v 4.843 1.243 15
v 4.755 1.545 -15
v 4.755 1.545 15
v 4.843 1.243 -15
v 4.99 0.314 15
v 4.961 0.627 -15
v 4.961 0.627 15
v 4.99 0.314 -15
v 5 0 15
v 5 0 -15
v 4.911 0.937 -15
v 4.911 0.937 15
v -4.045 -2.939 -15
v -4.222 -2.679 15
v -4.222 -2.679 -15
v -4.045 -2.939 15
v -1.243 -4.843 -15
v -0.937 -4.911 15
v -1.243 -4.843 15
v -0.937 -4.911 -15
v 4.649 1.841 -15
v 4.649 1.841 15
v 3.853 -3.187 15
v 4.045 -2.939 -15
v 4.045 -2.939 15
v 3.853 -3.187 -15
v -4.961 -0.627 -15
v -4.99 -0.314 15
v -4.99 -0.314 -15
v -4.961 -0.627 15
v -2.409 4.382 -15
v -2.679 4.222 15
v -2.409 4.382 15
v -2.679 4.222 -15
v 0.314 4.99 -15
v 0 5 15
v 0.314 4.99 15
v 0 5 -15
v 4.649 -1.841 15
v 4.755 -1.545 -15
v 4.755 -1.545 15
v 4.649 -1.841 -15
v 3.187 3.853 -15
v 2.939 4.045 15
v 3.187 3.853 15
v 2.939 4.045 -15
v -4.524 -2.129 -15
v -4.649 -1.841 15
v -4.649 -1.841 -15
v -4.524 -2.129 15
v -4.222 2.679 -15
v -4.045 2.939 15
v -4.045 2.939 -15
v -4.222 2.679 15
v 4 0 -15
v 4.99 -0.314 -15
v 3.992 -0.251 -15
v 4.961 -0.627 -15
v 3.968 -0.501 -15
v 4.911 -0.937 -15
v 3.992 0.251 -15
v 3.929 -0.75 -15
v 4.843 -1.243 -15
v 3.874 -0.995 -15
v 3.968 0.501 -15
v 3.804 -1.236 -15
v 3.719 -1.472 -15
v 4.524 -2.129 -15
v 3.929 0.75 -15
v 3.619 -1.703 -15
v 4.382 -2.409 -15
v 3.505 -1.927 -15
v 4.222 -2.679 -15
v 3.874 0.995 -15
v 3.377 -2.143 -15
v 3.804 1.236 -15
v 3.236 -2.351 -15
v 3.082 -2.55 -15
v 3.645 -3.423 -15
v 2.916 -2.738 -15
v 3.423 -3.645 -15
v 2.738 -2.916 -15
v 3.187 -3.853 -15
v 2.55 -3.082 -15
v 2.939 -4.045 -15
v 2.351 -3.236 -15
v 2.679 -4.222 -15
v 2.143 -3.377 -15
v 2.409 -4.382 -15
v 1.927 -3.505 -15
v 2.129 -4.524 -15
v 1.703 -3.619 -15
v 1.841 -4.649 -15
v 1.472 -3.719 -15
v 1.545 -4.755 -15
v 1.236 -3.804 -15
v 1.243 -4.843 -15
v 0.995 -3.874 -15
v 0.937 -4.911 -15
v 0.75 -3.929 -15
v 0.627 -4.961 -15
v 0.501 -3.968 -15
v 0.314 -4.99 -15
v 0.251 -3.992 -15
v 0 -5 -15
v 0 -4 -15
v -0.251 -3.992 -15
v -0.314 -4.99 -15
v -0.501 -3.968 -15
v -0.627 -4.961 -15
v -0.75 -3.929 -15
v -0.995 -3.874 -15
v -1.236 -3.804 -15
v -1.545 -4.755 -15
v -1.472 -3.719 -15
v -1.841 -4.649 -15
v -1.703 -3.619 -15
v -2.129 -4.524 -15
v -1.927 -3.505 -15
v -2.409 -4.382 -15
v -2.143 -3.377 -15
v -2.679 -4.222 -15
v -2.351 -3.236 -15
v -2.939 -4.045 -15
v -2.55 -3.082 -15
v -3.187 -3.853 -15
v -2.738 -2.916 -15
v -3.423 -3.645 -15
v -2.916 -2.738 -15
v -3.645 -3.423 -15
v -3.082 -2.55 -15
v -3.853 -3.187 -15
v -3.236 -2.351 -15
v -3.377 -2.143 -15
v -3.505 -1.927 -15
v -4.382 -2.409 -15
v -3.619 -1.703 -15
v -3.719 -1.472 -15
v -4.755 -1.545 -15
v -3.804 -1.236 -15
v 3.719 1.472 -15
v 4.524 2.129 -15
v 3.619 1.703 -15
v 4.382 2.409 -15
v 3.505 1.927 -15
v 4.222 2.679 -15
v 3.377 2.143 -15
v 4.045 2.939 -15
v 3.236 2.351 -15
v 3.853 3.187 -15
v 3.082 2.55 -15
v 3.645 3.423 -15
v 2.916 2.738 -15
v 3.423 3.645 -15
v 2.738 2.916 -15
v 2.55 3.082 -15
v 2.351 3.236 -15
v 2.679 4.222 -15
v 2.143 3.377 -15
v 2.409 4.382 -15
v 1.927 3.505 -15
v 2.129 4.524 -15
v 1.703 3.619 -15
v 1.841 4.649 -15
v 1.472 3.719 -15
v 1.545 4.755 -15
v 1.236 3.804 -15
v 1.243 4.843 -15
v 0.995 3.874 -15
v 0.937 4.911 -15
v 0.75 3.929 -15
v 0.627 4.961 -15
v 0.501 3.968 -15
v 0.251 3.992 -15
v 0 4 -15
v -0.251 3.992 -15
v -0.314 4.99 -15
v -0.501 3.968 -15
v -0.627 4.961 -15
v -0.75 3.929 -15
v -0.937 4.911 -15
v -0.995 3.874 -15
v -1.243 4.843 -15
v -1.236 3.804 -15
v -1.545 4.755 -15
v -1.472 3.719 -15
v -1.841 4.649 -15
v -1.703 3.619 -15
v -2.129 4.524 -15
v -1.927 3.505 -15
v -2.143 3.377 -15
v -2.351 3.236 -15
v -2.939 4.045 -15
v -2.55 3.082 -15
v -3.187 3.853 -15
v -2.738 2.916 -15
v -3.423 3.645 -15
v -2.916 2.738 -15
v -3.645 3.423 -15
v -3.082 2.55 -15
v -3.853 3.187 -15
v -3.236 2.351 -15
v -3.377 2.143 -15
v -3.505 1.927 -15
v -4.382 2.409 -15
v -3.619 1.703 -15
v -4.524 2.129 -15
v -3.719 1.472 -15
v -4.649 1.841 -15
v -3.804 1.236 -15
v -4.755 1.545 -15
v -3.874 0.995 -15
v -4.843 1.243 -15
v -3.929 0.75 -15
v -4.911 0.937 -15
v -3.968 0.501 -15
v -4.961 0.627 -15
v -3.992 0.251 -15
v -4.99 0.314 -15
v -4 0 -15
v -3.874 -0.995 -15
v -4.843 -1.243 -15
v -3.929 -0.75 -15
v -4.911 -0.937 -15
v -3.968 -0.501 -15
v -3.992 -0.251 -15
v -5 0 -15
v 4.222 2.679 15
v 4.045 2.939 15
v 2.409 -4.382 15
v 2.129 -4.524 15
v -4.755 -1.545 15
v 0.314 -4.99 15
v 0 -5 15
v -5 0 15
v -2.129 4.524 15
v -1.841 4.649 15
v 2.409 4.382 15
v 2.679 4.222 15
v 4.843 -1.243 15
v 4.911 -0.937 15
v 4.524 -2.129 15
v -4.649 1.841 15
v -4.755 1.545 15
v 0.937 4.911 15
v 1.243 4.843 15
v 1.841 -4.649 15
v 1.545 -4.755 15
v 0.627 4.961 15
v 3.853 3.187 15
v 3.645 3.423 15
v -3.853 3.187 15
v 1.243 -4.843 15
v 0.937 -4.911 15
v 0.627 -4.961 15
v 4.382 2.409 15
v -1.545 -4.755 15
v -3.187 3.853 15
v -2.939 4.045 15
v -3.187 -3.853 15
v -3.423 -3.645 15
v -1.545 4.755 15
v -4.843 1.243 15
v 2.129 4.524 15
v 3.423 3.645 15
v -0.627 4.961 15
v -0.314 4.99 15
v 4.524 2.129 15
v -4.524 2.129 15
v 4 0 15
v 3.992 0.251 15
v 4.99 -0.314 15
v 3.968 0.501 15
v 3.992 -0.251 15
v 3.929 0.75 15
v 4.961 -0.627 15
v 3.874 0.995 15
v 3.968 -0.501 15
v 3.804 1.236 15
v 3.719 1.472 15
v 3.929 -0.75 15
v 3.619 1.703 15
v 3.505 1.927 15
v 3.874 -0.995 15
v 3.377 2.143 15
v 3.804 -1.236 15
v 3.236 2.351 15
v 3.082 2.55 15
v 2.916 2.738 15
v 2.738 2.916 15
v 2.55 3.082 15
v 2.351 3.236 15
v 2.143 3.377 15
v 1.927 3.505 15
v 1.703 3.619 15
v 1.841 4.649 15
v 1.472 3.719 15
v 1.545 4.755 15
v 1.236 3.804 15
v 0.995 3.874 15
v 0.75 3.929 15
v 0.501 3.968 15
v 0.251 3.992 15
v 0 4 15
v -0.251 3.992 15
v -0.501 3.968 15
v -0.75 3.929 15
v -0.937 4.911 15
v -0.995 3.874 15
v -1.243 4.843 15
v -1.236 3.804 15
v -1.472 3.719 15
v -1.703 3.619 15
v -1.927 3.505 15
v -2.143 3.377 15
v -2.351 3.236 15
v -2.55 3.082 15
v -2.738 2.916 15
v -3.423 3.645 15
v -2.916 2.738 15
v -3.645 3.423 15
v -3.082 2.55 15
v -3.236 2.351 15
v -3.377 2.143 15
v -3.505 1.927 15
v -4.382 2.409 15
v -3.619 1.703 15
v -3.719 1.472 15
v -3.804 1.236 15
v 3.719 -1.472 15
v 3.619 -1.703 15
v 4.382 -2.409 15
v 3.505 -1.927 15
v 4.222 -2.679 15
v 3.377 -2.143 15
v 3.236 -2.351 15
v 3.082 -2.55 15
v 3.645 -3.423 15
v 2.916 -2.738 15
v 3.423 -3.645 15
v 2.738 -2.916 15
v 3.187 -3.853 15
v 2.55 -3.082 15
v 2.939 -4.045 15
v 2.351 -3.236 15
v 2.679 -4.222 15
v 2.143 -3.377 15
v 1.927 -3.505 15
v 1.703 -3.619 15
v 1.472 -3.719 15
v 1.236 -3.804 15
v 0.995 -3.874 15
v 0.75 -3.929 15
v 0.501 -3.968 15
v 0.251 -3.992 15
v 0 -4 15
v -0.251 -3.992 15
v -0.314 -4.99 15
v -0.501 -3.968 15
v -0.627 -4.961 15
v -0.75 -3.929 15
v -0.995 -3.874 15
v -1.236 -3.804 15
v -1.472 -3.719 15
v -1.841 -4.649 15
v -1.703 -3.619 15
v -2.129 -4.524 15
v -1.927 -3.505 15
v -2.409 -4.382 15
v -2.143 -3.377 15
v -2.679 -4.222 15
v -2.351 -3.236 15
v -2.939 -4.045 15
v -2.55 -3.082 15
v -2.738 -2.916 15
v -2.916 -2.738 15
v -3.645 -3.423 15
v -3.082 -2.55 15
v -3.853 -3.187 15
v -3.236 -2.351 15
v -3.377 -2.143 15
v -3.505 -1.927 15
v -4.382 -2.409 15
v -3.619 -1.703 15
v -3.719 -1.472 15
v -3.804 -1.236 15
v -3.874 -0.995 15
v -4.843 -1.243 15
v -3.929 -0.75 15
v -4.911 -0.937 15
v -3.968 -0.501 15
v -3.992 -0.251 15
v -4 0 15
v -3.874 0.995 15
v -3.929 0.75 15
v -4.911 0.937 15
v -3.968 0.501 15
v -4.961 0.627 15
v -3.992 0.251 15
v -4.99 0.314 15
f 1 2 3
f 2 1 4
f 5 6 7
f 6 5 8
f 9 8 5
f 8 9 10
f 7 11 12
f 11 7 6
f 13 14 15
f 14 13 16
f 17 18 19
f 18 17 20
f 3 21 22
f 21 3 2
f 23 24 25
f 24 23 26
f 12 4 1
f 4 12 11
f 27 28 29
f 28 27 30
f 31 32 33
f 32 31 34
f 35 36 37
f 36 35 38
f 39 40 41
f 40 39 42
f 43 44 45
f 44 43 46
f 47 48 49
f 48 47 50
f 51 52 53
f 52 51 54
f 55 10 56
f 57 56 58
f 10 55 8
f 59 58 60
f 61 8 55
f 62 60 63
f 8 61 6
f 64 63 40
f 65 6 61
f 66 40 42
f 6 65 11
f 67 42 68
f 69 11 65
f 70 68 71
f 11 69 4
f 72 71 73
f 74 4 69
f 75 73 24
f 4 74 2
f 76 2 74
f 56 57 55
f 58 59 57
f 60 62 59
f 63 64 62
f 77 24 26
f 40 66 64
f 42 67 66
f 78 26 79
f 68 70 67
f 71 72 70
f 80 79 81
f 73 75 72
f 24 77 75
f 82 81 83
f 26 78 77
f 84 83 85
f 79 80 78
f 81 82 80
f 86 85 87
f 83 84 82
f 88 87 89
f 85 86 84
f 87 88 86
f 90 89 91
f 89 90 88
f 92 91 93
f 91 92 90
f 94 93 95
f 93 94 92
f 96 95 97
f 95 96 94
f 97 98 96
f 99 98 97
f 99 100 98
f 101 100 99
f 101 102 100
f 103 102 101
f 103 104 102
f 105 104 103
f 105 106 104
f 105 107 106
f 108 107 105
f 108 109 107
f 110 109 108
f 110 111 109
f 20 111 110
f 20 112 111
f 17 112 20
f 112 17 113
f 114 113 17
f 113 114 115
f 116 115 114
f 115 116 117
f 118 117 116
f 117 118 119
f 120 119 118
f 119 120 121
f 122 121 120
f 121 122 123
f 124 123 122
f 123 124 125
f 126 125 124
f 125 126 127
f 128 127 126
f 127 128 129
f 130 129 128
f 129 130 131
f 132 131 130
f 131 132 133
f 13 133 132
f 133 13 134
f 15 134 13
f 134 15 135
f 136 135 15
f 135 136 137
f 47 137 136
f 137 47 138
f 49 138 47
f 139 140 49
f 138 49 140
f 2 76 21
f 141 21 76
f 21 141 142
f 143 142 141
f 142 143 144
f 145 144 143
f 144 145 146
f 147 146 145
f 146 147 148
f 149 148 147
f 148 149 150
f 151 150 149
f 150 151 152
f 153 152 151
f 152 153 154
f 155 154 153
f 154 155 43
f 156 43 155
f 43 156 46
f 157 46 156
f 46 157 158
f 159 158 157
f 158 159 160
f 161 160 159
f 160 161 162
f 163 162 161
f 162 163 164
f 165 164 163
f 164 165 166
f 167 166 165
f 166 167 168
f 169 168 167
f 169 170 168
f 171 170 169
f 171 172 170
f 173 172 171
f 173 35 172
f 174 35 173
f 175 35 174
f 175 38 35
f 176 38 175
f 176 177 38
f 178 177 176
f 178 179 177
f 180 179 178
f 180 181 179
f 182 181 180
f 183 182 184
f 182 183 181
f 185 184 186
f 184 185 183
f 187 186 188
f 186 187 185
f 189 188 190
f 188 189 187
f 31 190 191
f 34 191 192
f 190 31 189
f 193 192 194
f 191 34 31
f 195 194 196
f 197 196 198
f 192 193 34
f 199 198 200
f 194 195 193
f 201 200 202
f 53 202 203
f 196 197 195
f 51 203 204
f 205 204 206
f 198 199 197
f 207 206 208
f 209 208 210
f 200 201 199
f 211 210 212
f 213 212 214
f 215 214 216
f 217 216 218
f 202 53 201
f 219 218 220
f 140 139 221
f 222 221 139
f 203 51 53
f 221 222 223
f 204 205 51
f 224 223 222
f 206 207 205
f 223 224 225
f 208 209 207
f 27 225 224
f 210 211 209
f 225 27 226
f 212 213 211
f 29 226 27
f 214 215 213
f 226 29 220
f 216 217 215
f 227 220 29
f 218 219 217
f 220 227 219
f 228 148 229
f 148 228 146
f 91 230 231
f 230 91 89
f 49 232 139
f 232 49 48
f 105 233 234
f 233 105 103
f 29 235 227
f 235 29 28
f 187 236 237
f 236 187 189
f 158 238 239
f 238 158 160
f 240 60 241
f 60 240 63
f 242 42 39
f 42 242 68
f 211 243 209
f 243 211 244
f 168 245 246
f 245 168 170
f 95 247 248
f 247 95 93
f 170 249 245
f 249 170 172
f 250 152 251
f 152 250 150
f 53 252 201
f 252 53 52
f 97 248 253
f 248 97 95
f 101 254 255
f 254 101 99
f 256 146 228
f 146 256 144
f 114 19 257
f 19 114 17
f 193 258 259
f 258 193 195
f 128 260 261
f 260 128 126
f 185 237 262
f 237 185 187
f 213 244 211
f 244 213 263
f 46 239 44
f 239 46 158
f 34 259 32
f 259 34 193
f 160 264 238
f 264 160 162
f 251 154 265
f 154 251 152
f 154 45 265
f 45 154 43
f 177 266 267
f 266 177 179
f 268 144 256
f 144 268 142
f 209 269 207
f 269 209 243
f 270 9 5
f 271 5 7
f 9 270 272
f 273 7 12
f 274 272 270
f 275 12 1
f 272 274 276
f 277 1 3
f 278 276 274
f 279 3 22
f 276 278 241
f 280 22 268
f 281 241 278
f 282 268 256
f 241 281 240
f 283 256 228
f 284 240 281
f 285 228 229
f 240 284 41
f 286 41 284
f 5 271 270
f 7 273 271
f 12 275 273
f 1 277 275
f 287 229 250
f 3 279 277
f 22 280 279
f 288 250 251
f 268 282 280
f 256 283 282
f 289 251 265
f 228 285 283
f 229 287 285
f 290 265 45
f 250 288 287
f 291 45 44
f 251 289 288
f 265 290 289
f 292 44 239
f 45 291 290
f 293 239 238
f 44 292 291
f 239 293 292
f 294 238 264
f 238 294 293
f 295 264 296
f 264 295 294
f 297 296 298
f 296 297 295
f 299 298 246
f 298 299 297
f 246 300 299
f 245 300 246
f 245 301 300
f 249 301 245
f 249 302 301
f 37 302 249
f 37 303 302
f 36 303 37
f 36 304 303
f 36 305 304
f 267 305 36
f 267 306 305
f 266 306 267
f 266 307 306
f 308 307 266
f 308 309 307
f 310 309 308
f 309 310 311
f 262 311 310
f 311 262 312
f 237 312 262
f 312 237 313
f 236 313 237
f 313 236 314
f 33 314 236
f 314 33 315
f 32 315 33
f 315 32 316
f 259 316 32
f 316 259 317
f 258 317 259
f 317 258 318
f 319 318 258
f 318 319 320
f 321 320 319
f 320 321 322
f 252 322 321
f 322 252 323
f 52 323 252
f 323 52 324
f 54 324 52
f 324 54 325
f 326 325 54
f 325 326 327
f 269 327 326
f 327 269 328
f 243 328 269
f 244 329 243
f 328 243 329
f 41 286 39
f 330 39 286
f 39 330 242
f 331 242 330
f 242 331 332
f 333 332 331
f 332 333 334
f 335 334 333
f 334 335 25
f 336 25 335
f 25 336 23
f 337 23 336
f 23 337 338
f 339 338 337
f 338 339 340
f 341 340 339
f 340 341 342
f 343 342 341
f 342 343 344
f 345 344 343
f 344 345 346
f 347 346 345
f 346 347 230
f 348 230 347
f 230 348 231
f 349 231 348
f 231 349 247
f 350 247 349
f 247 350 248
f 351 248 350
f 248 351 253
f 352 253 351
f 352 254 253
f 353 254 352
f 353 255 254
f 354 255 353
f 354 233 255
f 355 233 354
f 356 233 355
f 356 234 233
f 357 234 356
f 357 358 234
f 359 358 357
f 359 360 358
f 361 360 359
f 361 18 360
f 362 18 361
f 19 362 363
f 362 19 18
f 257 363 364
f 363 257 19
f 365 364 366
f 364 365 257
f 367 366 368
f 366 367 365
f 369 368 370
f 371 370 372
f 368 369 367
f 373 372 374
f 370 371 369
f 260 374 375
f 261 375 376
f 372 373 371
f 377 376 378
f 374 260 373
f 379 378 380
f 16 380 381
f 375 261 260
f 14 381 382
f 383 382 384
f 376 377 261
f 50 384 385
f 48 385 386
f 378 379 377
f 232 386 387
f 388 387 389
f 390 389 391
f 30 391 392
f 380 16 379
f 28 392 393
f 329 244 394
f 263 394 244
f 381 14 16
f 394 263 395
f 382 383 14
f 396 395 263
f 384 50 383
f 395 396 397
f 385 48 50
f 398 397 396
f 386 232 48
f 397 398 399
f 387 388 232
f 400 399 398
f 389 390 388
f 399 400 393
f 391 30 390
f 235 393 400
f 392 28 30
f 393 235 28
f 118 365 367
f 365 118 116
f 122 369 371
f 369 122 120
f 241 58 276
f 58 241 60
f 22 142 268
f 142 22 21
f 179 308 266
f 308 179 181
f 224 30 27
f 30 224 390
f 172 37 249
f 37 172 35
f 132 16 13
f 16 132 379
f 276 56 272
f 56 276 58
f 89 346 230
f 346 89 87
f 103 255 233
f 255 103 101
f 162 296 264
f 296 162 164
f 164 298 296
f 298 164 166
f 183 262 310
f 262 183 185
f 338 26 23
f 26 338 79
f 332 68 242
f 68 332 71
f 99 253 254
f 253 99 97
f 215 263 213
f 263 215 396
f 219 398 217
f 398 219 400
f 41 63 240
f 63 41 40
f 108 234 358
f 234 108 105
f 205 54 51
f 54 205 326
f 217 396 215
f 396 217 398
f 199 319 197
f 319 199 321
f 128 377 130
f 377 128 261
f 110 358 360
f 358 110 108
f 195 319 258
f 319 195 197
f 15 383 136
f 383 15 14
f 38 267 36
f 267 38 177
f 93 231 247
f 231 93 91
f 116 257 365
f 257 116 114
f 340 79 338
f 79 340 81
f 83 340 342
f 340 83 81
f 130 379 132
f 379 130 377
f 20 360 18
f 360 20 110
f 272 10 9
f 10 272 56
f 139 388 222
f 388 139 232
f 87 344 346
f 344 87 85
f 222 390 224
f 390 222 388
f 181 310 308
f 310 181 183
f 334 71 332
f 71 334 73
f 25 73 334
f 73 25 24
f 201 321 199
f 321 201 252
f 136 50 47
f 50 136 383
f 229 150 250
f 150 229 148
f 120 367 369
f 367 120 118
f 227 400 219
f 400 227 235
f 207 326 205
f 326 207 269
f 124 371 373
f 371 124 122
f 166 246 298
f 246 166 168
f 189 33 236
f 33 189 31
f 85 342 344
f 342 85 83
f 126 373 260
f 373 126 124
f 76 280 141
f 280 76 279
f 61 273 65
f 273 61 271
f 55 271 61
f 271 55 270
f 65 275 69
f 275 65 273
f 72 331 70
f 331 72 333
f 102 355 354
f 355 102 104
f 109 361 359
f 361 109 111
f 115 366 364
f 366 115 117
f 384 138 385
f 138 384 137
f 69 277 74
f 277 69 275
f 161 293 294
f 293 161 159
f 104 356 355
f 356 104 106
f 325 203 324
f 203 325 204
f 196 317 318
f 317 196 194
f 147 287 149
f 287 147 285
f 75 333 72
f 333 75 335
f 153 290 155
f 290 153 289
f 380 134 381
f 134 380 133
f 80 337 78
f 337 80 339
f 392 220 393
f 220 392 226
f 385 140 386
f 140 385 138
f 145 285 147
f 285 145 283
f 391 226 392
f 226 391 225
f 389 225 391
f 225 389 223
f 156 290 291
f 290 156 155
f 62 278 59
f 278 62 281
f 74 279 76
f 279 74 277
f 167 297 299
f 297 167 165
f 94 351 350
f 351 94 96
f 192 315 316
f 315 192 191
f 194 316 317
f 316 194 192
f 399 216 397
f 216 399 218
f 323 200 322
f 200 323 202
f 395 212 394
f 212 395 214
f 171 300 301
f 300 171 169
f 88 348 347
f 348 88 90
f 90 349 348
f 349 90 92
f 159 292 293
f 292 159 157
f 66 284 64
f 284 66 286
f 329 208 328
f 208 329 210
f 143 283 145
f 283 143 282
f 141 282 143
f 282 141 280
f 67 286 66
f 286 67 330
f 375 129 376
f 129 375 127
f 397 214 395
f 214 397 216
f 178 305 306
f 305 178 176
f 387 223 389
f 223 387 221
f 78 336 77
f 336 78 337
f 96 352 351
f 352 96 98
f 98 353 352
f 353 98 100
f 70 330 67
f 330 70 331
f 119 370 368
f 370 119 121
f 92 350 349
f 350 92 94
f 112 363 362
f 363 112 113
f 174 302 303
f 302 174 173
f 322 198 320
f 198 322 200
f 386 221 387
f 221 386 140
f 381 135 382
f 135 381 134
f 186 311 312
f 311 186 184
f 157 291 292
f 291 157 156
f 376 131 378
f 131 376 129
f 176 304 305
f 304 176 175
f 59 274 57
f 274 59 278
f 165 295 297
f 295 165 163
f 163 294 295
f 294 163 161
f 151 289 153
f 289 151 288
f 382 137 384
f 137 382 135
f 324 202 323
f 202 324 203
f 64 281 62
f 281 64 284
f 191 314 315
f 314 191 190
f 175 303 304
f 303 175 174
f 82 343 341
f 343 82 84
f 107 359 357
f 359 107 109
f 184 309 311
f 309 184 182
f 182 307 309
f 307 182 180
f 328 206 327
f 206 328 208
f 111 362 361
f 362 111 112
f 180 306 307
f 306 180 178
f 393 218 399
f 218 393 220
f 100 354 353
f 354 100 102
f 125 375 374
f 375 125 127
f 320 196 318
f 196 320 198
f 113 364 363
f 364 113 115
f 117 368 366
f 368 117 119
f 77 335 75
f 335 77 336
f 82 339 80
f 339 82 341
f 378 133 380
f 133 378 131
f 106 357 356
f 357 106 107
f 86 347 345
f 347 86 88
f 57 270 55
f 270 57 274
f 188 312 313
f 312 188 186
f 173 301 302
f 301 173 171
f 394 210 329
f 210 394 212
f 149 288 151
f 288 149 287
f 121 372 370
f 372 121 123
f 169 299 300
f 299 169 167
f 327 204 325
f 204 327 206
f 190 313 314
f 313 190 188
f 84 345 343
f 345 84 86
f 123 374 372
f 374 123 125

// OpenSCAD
// variables
diameter = 10; // [10:400]
height = 30; // [1:400]
wallthickness = 1; // [1:30]
// model
difference(){
cylinder(h=height,d=diameter,center=true,$fn=100);
cylinder(h=height,d=diameter-2*wallthickness,center=true,$fn=100);
}
